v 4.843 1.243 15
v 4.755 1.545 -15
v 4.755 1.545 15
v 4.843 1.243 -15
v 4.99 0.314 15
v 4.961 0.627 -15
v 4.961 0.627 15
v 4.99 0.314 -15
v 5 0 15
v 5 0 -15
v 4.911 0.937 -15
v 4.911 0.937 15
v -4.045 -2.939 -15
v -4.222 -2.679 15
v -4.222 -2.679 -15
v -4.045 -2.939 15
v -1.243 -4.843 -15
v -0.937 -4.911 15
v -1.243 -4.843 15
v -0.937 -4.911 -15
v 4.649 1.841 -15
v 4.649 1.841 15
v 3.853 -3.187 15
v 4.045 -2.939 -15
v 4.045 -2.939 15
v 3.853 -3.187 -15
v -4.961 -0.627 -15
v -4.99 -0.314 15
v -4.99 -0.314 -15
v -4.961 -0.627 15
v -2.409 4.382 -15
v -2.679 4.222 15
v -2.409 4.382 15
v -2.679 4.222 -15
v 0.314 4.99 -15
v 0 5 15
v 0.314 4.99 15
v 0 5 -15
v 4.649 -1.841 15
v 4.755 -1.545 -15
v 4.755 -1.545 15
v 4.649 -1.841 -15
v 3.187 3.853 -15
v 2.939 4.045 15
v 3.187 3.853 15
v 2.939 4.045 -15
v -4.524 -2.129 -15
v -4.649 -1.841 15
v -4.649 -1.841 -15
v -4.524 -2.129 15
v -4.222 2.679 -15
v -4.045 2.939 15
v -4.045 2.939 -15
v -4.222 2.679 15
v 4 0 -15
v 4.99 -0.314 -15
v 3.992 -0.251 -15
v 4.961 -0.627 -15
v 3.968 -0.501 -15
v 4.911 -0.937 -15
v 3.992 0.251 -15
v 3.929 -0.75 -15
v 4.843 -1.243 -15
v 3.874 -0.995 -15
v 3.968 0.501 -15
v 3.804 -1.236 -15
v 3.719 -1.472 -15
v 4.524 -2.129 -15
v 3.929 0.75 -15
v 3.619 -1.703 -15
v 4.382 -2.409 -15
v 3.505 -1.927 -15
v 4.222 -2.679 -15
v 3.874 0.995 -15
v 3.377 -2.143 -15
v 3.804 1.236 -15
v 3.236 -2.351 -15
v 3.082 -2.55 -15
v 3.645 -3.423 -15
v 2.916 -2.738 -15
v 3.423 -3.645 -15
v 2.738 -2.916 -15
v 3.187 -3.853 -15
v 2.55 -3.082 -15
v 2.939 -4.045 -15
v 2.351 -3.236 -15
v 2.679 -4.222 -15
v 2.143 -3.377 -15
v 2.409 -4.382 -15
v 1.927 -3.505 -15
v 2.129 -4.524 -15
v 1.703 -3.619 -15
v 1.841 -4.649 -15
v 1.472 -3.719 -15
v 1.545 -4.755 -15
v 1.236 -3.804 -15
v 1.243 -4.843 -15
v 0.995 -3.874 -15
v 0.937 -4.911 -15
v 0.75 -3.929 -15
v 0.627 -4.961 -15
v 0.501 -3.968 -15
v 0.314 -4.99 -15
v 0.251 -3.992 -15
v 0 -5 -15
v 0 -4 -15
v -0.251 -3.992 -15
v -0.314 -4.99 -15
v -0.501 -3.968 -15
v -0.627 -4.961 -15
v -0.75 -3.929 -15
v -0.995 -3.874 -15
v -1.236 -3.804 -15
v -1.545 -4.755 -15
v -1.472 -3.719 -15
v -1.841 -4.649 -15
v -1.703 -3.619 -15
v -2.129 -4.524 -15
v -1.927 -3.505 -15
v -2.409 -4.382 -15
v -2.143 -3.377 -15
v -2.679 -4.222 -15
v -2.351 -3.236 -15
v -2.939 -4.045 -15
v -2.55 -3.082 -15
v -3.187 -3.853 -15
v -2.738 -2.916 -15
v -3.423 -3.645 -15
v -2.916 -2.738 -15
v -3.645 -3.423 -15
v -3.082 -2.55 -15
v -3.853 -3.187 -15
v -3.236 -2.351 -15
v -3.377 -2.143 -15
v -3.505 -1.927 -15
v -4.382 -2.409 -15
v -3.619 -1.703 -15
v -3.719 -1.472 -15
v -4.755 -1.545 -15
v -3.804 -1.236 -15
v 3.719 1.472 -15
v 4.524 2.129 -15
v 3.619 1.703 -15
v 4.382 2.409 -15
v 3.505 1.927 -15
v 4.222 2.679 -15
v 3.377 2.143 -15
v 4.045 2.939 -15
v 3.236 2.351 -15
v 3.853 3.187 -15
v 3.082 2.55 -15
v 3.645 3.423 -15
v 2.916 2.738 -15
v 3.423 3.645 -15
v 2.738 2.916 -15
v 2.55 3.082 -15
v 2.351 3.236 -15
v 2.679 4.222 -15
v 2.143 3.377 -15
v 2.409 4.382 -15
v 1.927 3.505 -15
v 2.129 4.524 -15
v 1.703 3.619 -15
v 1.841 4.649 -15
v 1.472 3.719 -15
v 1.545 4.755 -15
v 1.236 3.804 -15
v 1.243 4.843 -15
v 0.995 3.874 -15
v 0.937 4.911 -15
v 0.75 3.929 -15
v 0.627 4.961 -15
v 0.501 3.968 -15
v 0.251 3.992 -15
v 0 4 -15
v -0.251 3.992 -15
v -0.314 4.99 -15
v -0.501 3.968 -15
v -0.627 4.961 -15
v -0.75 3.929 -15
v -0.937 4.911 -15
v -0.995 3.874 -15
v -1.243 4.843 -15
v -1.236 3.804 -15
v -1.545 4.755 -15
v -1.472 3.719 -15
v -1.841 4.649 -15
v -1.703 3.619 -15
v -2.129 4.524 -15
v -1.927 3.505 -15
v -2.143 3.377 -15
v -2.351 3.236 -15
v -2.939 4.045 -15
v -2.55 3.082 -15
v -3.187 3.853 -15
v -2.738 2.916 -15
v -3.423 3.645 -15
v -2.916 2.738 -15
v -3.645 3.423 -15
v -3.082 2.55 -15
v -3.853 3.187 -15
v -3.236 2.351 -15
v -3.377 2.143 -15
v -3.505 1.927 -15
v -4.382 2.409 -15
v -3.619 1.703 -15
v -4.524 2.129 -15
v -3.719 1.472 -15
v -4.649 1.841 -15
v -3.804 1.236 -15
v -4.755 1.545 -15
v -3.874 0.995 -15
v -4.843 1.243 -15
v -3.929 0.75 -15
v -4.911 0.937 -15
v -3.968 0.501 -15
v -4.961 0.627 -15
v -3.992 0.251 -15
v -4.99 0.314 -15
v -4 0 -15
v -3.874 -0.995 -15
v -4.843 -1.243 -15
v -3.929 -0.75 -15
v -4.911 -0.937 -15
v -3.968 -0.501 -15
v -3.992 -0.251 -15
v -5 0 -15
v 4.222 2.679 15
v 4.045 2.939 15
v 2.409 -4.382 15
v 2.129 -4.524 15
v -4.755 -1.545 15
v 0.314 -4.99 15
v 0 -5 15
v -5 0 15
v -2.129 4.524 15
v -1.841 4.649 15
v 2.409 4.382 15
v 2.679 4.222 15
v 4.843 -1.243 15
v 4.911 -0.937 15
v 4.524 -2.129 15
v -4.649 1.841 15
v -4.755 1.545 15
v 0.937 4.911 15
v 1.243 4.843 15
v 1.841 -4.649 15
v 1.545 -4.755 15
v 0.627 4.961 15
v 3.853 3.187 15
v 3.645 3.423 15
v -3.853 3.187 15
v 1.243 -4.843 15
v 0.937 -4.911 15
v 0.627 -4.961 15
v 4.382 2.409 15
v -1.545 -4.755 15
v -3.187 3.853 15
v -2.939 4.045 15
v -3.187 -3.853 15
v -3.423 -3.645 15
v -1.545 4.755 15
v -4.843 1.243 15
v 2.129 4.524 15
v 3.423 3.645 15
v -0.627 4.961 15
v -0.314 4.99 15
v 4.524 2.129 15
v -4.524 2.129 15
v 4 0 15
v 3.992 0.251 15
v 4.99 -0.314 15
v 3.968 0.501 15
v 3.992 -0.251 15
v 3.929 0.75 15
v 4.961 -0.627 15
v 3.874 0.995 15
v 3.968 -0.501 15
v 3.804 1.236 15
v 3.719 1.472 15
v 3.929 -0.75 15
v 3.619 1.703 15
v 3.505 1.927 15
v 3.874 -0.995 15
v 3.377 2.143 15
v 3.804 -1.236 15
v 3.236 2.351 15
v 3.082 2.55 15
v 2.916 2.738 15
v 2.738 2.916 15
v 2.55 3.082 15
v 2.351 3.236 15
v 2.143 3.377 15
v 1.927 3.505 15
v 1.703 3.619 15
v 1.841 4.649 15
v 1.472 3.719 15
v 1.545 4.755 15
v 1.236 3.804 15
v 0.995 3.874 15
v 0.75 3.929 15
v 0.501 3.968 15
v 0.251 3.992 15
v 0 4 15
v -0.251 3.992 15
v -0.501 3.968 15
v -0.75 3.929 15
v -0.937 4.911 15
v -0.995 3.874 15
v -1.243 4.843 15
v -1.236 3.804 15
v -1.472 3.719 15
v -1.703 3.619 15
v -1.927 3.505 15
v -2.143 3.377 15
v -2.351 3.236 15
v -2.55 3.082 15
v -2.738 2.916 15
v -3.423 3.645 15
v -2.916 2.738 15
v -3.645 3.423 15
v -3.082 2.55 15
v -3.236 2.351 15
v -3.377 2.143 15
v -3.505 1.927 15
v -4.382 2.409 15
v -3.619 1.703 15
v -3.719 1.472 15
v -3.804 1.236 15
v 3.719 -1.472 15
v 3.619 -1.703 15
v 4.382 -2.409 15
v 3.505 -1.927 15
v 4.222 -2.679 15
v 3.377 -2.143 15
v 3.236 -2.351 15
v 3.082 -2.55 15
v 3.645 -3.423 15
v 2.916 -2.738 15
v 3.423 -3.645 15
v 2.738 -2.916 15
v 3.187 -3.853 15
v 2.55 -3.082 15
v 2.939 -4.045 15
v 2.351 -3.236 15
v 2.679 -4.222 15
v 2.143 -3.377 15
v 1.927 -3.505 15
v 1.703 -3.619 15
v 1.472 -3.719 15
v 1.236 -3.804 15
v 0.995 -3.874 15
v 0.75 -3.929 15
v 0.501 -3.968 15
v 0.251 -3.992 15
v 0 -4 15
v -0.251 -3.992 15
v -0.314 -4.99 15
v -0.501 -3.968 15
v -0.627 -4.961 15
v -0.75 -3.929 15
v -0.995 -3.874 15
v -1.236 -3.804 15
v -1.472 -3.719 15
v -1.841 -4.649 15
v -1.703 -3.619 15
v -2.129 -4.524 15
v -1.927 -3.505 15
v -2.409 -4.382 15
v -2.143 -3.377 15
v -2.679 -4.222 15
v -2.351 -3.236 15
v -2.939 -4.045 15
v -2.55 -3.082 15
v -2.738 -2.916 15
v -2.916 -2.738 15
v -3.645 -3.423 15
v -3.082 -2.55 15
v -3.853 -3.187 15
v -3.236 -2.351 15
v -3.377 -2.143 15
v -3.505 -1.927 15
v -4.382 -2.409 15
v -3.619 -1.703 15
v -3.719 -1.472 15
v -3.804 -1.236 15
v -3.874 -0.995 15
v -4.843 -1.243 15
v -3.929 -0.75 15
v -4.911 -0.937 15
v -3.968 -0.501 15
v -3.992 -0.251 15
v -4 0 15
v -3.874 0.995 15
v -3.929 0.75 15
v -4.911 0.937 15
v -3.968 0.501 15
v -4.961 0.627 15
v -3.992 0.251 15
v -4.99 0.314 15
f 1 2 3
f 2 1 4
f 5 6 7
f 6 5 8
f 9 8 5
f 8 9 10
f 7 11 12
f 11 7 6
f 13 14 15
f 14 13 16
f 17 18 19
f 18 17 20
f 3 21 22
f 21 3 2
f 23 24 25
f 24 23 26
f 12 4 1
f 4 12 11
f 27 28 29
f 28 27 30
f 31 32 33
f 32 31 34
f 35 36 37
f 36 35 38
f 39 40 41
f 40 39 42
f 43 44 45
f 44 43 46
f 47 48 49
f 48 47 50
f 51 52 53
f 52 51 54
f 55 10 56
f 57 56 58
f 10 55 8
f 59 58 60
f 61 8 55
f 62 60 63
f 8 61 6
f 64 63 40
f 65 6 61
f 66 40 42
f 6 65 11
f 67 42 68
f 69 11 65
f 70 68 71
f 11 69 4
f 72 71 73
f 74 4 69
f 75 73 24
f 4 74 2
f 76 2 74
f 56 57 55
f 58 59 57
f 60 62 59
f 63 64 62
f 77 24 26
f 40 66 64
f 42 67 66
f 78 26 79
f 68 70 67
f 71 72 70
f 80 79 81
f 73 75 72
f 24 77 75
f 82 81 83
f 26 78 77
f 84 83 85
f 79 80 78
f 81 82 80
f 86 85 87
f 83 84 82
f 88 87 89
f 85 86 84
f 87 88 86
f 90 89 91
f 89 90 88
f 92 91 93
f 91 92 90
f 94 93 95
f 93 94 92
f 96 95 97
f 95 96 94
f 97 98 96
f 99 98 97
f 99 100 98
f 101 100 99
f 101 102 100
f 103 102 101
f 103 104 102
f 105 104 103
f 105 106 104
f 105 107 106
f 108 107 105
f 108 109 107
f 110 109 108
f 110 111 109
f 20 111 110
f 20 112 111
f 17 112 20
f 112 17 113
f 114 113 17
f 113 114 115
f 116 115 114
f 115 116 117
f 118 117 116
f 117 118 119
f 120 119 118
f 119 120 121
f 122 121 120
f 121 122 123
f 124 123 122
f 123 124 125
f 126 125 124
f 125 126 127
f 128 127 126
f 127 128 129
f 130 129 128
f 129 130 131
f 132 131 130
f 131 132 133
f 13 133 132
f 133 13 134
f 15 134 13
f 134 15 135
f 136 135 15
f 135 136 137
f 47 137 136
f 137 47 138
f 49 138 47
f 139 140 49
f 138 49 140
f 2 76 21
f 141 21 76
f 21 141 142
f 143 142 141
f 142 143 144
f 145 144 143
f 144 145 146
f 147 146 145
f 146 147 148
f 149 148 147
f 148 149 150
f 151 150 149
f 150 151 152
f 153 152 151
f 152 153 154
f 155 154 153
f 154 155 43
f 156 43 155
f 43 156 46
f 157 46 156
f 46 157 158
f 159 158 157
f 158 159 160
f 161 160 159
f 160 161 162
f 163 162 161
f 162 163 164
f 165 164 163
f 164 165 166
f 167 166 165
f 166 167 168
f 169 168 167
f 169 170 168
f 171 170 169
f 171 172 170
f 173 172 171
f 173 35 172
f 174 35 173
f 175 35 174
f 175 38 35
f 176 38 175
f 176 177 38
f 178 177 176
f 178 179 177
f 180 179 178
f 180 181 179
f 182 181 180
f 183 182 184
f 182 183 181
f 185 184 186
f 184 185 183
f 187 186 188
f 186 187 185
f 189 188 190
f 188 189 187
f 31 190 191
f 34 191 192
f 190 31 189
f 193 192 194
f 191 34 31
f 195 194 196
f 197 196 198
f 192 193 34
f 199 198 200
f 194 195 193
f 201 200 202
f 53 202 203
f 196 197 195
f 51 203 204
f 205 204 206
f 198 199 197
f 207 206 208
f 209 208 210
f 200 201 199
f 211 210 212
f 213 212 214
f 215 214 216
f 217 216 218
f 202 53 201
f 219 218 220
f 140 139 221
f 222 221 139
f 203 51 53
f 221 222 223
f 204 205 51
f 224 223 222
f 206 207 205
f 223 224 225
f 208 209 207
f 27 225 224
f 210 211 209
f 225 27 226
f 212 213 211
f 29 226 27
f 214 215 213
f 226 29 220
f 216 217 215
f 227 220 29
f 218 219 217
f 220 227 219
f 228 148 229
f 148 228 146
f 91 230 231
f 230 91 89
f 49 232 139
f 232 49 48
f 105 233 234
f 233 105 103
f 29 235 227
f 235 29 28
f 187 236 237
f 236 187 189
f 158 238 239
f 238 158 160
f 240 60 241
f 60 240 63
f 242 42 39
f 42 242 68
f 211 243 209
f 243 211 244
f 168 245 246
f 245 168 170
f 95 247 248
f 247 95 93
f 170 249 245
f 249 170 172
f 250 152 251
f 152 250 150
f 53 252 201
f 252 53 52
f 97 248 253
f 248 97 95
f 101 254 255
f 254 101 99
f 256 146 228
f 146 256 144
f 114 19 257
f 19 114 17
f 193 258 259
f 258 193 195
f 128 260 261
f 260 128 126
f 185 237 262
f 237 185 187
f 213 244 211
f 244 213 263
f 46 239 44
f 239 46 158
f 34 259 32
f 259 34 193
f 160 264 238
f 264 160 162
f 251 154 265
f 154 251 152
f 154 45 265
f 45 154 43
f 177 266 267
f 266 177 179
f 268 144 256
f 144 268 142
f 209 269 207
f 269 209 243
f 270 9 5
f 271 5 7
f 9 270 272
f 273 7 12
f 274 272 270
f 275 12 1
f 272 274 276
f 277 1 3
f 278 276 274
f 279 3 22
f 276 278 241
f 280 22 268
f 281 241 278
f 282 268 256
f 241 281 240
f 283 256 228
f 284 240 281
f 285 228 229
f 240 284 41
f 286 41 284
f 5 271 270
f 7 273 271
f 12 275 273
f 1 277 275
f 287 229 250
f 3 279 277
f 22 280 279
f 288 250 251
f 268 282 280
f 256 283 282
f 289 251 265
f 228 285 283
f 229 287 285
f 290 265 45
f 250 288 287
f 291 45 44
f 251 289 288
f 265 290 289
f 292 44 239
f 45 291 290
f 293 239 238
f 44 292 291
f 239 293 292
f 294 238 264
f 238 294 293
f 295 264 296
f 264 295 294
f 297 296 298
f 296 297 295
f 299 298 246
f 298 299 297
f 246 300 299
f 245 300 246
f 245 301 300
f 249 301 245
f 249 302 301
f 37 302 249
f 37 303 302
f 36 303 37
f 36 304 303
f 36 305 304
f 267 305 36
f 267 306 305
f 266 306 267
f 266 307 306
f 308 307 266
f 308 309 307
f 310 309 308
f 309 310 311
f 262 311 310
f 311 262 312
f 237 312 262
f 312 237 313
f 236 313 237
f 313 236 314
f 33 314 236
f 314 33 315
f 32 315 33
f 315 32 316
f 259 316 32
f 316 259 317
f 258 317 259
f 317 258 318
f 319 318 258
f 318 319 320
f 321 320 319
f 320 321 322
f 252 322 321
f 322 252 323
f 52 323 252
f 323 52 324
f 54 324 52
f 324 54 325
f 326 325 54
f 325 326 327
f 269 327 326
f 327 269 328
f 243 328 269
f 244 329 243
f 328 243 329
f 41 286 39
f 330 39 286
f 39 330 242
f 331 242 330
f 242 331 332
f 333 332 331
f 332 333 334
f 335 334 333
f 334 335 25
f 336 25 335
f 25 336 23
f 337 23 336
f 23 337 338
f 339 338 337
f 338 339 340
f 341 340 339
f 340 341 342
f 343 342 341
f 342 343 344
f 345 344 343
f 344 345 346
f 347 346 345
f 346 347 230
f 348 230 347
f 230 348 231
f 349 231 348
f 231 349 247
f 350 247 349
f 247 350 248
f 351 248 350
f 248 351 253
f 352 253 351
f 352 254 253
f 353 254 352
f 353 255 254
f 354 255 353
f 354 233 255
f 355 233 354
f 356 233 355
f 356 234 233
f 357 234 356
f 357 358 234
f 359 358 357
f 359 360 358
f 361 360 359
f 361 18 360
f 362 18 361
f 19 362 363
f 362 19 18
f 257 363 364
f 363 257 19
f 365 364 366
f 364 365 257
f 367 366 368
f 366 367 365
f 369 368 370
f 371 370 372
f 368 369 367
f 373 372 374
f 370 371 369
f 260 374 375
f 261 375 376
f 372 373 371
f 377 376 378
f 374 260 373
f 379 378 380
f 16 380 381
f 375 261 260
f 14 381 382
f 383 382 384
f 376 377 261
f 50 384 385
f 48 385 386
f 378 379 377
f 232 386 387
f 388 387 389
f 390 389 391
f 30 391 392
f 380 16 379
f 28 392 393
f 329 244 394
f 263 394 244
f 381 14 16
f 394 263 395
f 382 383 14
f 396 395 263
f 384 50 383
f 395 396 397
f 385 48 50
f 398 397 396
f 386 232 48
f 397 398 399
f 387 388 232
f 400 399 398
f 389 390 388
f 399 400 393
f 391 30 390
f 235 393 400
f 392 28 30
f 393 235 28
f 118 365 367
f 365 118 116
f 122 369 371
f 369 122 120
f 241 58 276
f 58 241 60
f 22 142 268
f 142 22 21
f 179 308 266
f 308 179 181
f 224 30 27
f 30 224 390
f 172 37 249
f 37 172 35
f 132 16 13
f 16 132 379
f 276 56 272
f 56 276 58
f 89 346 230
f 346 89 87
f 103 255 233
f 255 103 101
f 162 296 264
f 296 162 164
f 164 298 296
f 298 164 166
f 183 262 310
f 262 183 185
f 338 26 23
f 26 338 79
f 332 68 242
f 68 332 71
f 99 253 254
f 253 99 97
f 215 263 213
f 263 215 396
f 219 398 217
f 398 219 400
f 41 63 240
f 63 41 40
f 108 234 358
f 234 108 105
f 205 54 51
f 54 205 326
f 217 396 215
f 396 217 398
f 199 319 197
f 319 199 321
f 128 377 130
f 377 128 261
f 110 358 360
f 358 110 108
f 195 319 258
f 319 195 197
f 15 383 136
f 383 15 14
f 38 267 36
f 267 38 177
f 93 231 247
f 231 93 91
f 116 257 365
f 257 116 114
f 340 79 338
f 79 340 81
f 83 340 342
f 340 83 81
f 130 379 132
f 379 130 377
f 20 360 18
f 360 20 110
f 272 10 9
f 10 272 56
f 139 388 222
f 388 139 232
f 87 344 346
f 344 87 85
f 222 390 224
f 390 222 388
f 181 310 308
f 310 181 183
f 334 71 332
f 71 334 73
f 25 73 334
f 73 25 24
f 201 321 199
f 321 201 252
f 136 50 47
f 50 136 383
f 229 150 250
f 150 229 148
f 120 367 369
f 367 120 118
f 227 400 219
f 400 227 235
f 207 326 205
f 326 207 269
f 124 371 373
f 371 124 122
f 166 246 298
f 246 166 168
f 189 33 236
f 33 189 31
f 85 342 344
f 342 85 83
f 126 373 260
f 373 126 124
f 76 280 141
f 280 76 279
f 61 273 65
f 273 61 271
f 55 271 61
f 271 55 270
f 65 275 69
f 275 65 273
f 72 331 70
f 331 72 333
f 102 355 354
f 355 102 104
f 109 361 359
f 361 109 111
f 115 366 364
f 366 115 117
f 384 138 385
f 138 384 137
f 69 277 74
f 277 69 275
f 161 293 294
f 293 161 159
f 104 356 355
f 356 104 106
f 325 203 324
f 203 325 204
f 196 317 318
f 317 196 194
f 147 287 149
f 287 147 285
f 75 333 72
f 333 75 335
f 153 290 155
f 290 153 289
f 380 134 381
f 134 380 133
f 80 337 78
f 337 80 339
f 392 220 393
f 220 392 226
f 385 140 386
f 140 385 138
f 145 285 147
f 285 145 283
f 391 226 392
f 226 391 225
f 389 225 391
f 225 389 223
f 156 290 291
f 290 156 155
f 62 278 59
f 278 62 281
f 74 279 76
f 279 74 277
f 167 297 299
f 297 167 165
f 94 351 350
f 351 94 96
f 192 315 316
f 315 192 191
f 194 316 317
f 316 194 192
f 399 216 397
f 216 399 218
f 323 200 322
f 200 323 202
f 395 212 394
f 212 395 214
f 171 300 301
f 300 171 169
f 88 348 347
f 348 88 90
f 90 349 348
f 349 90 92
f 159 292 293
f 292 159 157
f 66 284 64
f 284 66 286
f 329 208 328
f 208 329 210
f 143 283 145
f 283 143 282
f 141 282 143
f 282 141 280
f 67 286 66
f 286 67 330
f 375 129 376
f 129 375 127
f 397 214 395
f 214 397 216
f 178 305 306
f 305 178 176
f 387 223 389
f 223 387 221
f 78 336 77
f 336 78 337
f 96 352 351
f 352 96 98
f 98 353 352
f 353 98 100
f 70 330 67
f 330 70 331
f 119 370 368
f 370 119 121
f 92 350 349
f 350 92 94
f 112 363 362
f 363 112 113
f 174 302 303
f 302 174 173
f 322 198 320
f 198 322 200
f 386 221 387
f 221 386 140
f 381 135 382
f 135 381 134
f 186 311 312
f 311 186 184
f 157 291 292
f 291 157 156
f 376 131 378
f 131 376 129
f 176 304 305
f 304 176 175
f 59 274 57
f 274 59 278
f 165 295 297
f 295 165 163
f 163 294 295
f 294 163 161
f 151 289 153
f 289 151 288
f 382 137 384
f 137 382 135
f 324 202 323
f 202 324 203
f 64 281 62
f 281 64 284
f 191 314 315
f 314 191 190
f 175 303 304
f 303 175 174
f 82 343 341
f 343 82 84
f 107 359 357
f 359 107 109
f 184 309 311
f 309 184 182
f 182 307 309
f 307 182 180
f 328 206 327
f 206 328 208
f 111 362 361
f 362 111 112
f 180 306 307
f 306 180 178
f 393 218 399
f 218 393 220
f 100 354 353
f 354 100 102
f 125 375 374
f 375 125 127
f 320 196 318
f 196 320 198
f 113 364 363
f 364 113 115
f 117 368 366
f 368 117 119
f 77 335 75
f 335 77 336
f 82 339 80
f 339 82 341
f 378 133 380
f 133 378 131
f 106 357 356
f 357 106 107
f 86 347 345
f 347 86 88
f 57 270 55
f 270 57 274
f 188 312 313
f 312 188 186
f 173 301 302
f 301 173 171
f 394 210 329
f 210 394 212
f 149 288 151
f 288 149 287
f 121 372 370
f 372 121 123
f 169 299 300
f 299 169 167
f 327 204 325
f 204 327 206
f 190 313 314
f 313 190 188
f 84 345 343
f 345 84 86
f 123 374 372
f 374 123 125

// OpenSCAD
// variables
diameter = 10; // [10:400]
height = 30; // [1:400]
wallthickness = 1; // [1:30]
// model
difference(){
cylinder(h=height,d=diameter,center=true,$fn=100);
cylinder(h=height,d=diameter-2*wallthickness,center=true,$fn=100);
}
